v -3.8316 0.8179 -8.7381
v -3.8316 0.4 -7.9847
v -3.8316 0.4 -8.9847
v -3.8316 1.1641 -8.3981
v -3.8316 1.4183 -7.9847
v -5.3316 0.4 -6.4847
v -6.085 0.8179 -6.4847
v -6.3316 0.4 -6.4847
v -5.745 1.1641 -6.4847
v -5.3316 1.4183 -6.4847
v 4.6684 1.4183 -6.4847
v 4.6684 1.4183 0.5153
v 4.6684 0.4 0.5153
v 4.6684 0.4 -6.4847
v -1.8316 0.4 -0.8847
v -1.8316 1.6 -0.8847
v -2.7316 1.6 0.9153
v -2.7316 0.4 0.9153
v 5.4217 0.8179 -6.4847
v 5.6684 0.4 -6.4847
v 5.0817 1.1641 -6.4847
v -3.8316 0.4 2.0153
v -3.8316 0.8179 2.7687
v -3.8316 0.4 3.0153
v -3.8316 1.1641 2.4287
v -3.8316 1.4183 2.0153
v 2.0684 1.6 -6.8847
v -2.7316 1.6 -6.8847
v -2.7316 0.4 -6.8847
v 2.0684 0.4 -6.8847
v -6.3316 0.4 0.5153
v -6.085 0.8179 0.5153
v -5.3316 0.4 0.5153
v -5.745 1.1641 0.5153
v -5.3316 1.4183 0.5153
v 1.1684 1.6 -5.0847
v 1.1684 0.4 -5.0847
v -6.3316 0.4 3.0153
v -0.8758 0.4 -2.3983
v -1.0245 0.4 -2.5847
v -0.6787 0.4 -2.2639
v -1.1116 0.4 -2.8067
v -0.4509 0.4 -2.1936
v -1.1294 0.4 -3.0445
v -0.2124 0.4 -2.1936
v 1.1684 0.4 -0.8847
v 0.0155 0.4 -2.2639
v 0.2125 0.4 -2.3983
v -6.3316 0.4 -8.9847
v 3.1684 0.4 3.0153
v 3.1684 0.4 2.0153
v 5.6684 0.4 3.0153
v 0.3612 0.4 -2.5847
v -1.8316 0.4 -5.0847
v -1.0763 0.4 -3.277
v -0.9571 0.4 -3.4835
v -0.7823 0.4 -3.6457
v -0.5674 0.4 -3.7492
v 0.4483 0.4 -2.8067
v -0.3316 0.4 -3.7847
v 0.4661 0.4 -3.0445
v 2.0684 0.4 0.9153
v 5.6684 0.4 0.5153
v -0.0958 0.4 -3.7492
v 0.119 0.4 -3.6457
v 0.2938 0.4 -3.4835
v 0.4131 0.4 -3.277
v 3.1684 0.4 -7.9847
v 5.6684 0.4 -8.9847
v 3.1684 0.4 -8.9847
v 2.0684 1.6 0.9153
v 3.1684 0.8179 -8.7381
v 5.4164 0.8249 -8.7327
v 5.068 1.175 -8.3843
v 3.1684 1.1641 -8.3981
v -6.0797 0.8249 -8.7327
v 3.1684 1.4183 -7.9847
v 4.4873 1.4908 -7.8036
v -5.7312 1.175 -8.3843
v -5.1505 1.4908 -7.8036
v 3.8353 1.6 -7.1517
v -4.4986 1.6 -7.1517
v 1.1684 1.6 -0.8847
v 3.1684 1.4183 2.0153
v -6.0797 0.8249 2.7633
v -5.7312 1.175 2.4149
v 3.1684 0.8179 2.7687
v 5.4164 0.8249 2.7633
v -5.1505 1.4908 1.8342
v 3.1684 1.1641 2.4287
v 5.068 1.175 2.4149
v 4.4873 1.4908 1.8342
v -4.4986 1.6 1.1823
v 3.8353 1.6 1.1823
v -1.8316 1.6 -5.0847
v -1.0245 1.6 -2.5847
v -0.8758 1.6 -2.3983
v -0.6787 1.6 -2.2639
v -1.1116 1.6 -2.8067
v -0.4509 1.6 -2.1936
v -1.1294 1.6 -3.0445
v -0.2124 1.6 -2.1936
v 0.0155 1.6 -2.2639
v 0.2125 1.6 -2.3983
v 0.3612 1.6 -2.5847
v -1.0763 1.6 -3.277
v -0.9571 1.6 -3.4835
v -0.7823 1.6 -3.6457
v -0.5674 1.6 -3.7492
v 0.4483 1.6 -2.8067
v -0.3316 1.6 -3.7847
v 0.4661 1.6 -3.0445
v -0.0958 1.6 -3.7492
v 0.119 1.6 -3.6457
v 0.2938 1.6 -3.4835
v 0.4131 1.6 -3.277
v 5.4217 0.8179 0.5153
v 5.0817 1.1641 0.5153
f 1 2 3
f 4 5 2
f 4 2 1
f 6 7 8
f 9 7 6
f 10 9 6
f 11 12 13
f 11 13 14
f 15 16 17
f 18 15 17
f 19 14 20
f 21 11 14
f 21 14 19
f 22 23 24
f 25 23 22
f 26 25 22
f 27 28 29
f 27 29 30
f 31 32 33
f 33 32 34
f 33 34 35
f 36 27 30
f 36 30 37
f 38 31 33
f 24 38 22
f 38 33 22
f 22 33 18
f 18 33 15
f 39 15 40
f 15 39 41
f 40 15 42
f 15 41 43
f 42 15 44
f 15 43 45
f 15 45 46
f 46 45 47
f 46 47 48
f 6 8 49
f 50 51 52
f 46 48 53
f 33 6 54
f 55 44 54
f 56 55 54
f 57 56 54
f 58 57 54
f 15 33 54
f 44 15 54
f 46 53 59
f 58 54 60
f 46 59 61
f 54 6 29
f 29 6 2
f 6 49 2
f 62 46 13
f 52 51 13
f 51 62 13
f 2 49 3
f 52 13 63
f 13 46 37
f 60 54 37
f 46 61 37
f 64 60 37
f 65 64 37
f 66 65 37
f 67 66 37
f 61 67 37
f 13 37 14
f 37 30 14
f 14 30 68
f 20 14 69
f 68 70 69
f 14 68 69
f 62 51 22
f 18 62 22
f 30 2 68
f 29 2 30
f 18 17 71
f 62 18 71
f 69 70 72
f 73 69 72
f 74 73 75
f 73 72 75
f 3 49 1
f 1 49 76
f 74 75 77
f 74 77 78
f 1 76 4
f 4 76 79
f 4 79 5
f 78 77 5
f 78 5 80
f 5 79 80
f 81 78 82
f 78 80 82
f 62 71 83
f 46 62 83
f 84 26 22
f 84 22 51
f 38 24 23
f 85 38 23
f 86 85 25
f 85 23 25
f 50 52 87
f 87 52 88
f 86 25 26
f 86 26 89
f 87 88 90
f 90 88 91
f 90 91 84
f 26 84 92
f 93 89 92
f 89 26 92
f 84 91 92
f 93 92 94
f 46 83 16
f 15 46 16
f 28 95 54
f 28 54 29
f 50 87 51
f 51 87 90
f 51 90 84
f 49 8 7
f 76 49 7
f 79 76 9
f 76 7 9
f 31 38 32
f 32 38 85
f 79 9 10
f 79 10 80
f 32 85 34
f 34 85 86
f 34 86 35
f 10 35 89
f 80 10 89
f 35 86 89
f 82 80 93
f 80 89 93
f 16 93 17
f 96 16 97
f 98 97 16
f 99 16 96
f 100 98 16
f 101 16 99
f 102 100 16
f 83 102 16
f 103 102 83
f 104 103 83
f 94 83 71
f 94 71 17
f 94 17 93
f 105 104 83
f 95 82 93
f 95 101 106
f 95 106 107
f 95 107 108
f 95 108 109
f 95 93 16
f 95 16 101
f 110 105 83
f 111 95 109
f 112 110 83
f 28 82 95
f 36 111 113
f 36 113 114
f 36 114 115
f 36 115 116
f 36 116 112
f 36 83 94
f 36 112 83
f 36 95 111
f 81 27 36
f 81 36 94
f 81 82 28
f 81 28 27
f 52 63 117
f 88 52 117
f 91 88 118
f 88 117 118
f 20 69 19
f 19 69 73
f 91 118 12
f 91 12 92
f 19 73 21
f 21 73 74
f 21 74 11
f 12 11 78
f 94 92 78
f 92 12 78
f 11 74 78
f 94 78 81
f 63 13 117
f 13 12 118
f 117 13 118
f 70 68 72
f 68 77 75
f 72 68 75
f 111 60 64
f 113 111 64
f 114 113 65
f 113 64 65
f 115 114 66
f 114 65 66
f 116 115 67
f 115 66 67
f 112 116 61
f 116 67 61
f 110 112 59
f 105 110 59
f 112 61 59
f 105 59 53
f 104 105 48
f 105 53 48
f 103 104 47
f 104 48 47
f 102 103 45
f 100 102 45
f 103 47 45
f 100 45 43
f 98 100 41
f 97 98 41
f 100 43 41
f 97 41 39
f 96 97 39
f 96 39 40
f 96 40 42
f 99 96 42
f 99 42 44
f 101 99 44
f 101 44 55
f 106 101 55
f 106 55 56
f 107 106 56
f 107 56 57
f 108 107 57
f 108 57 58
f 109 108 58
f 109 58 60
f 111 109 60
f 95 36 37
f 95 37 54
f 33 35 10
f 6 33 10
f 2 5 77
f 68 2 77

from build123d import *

# Parameters (mm, degrees)
SKETCH_1_W          = 20
SKETCH_1_H          = 20
EXTRUDE_1_DEPTH     = 2
CUT_EXTRUDE_1_DEPTH = 17.713614462
SCALE_1_SCALE       = 0.6
SKETCH_5_W          = 7
SKETCH_5_H          = 1
SKETCH_5_W_2        = 1
SKETCH_5_H_2        = 7
CUT_EXTRUDE_2_DEPTH = 12.05686647
FILLET_1_R          = 2
SKETCH_6_R          = 0.8
CUT_EXTRUDE_3_DEPTH = 12.05686647


with BuildPart() as part:
    # 草图1 → 凸台-拉伸1 (new body)
    with BuildSketch(Plane(origin=(0, 0, 0), x_dir=(1, 0, 0), z_dir=(0, 1, 0))):
        with Locations((-0.331632653, 2.984693878)):
            Rectangle(SKETCH_1_W, SKETCH_1_H)
    extrude(amount=EXTRUDE_1_DEPTH)

    # 草图2 → 切除-拉伸1 (cut, through all)
    with BuildSketch(Plane(origin=(0, 2, 0), x_dir=(1, 0, 0), z_dir=(0, 1, 0))):
        Polygon((-4.331632653, 9.484693878), (3.668367347, 9.484693878), (2.168367347, 6.484693878), (-2.831632653, 6.484693878), align=None)
        Polygon((3.668367347, -3.515306122), (2.168367347, -0.515306122), (-2.831632653, -0.515306122), (-4.331632653, -3.515306122), align=None)
    extrude(amount=-CUT_EXTRUDE_1_DEPTH, mode=Mode.SUBTRACT)


with BuildPart() as part_1:
    # 缩放比例1: scaled about (-0.331632653, 1, -2.984693878)
    add(part.part.scale(SCALE_1_SCALE).moved(Location((-0.132653061, 0.4, -1.193877551))))

    # 草图5 → 切除-拉伸2 (cut, through all)
    with BuildSketch(Plane(origin=(0, 1.6, 0), x_dir=(1, 0, 0), z_dir=(0, 1, 0))):
        with Locations((-0.331632653, -2.515306122)):
            Rectangle(SKETCH_5_W, SKETCH_5_H)
        with Locations((-5.831632653, 2.984693878)):
            Rectangle(SKETCH_5_W_2, SKETCH_5_H_2)
        with Locations((-0.331632653, 8.484693878)):
            Rectangle(SKETCH_5_W, SKETCH_5_H)
        with Locations((5.168367347, 2.984693878)):
            Rectangle(SKETCH_5_W_2, SKETCH_5_H_2)
    extrude(amount=-CUT_EXTRUDE_2_DEPTH, mode=Mode.SUBTRACT)

    # 圆角1
    # the kernel refuses this fillet: 2 mm, written as the material it takes off along each edge
    with BuildSketch(Plane(origin=(5.668367347, 1.6, -4.067269573), x_dir=(-1, 0, 0), z_dir=(0, 0, 1)), Plane(origin=(-1.414208348, 1.6, -8.984693878), x_dir=(0, 0, 1), z_dir=(1, 0, 0)), Plane(origin=(-6.331632653, 1.6, -1.902118183), x_dir=(1, 0, 0), z_dir=(0, 0, -1)), Plane(origin=(-6.331632653, 1.6, 7.597881817), x_dir=(1, 0, 0), z_dir=(0, 0, -1)), Plane(origin=(10.250943042, 1.6, 3.015306122), x_dir=(0, 0, -1), z_dir=(-1, 0, 0)), Plane(origin=(5.668367347, 1.6, -13.567269573), x_dir=(-1, 0, 0), z_dir=(0, 0, 1)), Plane(origin=(0.750943042, 1.6, 3.015306122), x_dir=(0, 0, -1), z_dir=(-1, 0, 0))) as fillet_1_piece_1:
        with BuildLine():
            CenterArc((1.833030278, 2), FILLET_1_R, 203.578178478, 66.421821522)
            Line((0, 1.2), (0, 0))
            Line((0, 0), (1.833030278, 0))
        make_face()
    extrude(amount=11.66515139, mode=Mode.SUBTRACT)
    with BuildSketch(Plane(origin=(-10.914208348, 1.6, -8.984693878), x_dir=(0, -1, 0), z_dir=(1, 0, 0))) as fillet_1_piece_2:
        with BuildLine():
            CenterArc((2, -1.833030278), FILLET_1_R, 113.578178478, 66.421821522)
            Line((0, -1.833030278), (0, 0))
            Line((0, 0), (1.2, 0))
        make_face()
    extrude(amount=11.66515139, mode=Mode.SUBTRACT)

    # 草图6 → 切除-拉伸3 (cut, through all)
    with BuildSketch(Plane.XZ.offset(-0.4)):
        with Locations(Location((-0.331632653, -2.984693878, 0), (0, 0, 270))):
            Circle(SKETCH_6_R)
    extrude(amount=-CUT_EXTRUDE_3_DEPTH, mode=Mode.SUBTRACT)


solid = part_1.part
